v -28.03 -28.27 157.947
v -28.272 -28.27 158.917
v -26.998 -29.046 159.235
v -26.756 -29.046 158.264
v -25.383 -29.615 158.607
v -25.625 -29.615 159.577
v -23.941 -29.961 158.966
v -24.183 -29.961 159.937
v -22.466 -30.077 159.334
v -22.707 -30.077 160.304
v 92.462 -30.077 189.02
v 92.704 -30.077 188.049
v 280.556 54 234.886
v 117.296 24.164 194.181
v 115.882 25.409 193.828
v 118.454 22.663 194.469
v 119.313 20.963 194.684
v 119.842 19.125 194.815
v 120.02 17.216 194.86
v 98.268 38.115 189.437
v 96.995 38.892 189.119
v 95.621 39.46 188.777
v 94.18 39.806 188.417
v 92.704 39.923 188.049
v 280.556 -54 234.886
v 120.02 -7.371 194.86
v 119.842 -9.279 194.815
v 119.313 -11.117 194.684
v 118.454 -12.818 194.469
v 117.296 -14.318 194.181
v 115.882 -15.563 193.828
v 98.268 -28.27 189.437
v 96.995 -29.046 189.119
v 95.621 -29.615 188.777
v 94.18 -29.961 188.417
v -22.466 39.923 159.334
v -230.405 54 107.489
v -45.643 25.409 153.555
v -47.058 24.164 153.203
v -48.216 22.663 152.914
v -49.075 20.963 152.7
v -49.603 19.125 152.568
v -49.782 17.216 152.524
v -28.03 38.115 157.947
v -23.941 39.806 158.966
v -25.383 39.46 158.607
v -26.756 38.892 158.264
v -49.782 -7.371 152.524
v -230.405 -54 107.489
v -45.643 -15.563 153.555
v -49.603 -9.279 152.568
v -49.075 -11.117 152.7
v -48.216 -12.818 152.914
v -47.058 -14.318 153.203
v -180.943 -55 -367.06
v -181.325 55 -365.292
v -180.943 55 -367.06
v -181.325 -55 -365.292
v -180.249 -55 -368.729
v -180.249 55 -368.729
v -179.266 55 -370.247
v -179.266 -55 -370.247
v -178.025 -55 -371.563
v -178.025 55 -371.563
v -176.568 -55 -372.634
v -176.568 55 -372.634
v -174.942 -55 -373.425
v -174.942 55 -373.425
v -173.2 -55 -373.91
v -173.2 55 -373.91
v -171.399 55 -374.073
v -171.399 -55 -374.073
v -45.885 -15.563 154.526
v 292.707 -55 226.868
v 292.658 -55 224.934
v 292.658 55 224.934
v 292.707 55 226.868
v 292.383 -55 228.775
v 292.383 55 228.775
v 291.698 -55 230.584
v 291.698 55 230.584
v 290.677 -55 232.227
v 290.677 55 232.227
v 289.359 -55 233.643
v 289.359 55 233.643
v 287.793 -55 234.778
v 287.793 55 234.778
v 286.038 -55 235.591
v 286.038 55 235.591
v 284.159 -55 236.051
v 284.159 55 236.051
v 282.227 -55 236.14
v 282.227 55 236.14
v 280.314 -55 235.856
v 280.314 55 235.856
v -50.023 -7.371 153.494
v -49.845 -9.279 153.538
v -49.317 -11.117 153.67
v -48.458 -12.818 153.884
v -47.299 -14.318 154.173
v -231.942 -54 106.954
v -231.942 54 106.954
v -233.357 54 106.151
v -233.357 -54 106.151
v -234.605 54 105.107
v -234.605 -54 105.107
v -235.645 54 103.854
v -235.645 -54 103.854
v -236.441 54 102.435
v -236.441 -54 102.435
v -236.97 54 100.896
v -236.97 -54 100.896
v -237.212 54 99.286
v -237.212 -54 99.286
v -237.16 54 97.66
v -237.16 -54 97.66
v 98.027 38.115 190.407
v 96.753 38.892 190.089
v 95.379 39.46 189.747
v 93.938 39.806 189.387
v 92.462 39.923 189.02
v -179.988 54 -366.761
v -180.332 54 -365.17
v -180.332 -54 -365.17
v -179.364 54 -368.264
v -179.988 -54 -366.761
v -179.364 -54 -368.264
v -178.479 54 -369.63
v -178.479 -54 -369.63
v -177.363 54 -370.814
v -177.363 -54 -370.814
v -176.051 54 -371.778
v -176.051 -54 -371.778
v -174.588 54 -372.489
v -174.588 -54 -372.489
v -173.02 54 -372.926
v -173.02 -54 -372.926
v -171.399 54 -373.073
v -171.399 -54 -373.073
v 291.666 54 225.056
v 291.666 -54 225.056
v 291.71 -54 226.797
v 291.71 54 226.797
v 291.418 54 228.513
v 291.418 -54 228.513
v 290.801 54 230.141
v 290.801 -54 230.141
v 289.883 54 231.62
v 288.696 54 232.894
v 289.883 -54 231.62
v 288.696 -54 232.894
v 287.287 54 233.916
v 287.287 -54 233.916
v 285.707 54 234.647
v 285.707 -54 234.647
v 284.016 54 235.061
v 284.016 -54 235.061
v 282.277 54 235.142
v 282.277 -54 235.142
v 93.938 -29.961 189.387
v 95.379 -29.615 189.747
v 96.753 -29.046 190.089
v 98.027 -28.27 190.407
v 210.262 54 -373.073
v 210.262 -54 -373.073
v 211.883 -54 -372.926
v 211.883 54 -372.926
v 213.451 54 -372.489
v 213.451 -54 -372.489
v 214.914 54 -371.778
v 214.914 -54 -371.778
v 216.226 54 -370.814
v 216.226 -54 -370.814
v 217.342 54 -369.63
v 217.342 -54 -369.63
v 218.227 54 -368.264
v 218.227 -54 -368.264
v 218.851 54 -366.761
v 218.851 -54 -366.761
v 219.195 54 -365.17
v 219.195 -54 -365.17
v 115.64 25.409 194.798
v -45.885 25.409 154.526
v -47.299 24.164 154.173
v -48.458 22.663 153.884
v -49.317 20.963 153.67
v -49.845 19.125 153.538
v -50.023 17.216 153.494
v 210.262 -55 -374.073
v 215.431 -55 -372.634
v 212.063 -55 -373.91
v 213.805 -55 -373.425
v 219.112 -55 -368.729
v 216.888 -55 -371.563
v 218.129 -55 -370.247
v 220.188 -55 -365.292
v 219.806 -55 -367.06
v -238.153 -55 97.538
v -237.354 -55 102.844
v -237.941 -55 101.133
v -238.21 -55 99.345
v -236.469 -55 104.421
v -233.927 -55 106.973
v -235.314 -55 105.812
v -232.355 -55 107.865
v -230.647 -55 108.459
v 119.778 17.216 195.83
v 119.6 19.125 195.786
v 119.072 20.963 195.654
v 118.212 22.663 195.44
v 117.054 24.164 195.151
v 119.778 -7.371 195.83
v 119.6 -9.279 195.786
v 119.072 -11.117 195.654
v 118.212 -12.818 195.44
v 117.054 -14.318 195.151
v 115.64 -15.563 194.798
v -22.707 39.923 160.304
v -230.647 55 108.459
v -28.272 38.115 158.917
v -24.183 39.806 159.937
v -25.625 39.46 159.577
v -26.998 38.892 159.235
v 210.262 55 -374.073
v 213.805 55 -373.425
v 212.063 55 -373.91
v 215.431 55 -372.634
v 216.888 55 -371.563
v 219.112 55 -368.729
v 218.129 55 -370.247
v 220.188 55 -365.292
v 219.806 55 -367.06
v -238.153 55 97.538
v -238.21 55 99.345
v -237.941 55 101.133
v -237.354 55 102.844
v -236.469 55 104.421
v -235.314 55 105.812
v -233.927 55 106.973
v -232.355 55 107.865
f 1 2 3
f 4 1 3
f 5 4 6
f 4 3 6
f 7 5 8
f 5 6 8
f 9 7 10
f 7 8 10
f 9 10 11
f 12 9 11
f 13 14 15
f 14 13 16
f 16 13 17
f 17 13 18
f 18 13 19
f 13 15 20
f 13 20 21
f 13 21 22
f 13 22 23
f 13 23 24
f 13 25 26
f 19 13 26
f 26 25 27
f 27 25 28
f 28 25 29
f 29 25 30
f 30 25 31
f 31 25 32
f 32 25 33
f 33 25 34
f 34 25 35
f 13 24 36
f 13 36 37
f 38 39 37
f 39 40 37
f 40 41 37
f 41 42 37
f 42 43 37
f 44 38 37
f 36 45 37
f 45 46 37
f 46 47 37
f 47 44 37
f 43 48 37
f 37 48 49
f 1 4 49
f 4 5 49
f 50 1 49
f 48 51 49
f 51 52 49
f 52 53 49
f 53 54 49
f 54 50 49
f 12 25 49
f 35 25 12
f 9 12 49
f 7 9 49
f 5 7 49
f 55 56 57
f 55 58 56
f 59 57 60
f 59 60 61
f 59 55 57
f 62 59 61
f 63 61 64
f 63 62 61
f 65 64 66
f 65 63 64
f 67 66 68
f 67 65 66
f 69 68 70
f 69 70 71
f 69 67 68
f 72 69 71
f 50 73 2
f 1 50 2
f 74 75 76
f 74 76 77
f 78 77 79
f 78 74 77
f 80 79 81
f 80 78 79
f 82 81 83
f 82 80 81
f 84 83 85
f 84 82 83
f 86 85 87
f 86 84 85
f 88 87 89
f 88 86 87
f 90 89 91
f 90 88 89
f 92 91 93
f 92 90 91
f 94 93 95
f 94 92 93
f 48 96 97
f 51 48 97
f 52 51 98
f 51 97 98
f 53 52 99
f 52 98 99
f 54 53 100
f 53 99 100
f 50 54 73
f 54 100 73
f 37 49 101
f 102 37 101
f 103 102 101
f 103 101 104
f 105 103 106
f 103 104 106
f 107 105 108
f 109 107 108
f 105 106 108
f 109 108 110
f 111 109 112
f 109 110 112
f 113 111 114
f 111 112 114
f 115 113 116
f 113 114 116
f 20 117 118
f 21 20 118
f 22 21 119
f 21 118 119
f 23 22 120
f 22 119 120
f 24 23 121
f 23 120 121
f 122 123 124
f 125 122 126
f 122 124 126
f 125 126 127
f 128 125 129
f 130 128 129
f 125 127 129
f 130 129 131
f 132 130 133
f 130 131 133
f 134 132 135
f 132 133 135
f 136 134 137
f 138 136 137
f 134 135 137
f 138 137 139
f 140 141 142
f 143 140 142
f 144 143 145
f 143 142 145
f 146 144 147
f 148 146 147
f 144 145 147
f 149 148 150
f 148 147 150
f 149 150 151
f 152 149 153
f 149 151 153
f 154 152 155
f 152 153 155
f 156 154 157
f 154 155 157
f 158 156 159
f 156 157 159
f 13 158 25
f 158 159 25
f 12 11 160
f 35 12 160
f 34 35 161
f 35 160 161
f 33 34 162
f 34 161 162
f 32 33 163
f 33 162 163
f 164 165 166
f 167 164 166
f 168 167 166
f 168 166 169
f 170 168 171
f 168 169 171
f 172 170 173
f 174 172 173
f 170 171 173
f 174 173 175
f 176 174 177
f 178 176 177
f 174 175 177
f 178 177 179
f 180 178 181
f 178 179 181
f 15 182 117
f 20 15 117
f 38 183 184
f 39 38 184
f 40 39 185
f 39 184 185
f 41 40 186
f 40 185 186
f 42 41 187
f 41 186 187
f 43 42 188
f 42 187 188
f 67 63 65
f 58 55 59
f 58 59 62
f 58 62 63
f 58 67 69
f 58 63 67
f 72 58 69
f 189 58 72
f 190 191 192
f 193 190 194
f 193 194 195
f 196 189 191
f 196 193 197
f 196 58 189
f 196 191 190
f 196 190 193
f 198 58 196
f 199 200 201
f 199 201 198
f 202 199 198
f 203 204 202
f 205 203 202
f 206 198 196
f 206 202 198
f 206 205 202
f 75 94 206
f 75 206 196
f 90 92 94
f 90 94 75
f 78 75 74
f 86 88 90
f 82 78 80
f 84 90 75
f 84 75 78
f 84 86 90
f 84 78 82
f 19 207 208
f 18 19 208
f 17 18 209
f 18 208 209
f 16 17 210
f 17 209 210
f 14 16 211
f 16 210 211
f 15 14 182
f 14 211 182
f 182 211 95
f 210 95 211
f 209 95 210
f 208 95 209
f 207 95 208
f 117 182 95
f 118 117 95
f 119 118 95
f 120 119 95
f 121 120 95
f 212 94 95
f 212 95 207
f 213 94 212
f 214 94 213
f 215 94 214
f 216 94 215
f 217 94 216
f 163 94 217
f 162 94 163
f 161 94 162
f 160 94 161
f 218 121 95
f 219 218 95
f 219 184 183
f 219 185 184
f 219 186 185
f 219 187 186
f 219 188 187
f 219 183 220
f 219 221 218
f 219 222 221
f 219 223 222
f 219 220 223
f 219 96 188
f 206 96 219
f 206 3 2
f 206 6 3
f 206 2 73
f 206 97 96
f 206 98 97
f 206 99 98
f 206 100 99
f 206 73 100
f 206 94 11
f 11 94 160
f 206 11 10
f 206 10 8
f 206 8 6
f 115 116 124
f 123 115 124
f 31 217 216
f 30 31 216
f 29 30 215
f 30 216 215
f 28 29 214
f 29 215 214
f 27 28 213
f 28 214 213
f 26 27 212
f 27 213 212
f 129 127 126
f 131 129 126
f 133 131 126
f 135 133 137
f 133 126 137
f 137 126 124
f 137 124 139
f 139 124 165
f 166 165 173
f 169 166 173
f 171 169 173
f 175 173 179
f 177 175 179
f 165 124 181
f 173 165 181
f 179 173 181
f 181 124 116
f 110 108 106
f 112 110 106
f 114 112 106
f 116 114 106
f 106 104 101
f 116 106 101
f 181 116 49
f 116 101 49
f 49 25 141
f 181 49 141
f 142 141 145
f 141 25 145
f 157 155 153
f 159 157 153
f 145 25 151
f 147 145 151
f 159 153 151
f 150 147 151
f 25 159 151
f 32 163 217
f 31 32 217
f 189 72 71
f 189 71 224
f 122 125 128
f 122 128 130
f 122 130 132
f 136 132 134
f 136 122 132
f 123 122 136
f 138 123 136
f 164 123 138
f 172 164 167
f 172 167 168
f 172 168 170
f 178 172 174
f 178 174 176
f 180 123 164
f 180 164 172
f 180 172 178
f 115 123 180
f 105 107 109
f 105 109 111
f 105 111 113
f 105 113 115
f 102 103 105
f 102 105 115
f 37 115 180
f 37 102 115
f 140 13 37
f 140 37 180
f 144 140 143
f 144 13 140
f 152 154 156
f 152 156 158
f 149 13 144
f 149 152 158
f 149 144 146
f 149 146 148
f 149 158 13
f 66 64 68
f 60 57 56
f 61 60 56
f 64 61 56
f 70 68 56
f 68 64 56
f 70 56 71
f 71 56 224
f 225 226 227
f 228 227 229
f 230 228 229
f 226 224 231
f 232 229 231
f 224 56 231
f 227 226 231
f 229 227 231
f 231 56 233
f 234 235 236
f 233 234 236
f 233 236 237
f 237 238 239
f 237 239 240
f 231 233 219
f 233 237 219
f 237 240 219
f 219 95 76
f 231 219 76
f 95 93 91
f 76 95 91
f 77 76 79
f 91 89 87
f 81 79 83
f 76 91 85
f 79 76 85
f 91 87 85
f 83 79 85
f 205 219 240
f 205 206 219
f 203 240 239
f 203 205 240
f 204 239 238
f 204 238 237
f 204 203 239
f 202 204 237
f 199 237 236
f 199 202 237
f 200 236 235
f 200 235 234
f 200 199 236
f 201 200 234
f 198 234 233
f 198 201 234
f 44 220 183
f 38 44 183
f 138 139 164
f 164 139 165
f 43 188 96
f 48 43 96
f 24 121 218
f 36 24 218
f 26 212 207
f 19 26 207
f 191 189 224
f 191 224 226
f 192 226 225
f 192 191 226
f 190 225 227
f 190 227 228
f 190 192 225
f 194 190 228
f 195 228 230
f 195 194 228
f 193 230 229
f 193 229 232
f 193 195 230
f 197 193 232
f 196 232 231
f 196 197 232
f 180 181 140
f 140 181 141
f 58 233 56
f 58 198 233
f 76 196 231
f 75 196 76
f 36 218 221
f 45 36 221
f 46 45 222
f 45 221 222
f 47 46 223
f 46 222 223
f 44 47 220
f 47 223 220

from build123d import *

# Parameters (mm, degrees)
F1_DEPTH = 55
F2_T     = -1
F4_DEPTH = 1


with BuildPart() as f1:
    # F0 (on Front) → F1 (new body, symmetric)
    with BuildSketch(Plane.XZ):
        with BuildLine():
            ThreePointArc((-181.3245903513, -365.2919652377), (-178.0253293171, -371.5628290115), (-171.3991288349, -374.0732718036))
            Line((-171.3991288349, -374.0732718036), (210.2621403614, -374.0732718036))
            ThreePointArc((210.2621403614, -374.0732718036), (216.8883408435, -371.5628290115), (220.1876018778, -365.2919652377))
            Line((220.1876018778, -365.2919652377), (292.6582958135, 224.9344720505))
            ThreePointArc((292.6582958135, 224.9344720505), (289.3590347792, 233.6427226924), (280.3136153411, 235.8561227473))
            Line((280.3136153411, 235.8561227473), (-230.6466922573, 108.4594097216))
            ThreePointArc((-230.6466922573, 108.4594097216), (-236.4687351875, 104.4205148281), (-238.1529348177, 97.5377590248))
            Line((-238.1529348177, 97.5377590248), (-181.3245903513, -365.2919652377))
        make_face()
    extrude(amount=F1_DEPTH, both=True)

    # F2 (hollow: no face is removed)
    offset(amount=F2_T, mode=Mode.SUBTRACT)

    # F3 (on face) → F4 (cut, through all)
    with BuildSketch(Plane(origin=(-38.9581795543, 0, 156.2527237618), x_dir=(0.9702957263, 0, 0.2419218956), z_dir=(-0.2419218956, 0, 0.9702957263))):
        with BuildLine():
            ThreePointArc((-7.1386698707, 25.4085332208), (-10.2738331899, 21.8343178236), (-11.404046427, 17.2162140156))
            Line((-11.404046427, 17.2162140156), (-11.404046427, -7.3706747529))
            ThreePointArc((-11.404046427, -7.3706747529), (-10.2738331899, -11.988778561), (-7.1386698707, -15.5629939581))
            Line((-7.1386698707, -15.5629939581), (11.0135524375, -28.2695495739))
            ThreePointArc((11.0135524375, -28.2695495739), (13.7417820324, -29.6146092552), (16.7481758812, -30.0772303687))
            Line((16.7481758812, -30.0772303687), (135.4437312648, -30.0772303687))
            ThreePointArc((135.4437312648, -30.0772303687), (138.4501251136, -29.6146092552), (141.1783547084, -28.2695495739))
            Line((141.1783547084, -28.2695495739), (159.3305770166, -15.5629939581))
            ThreePointArc((159.3305770166, -15.5629939581), (162.4657403358, -11.988778561), (163.595953573, -7.3706747529))
            Line((163.595953573, -7.3706747529), (163.595953573, 17.2162140156))
            ThreePointArc((163.595953573, 17.2162140156), (162.4657403358, 21.8343178236), (159.3305770166, 25.4085332208))
            Line((159.3305770166, 25.4085332208), (141.1783547084, 38.1150888365))
            ThreePointArc((141.1783547084, 38.1150888365), (138.4501251136, 39.4601485179), (135.4437312648, 39.9227696313))
            Line((135.4437312648, 39.9227696313), (16.7481758812, 39.9227696313))
            ThreePointArc((16.7481758812, 39.9227696313), (13.7417820324, 39.4601485179), (11.0135524375, 38.1150888365))
            Line((11.0135524375, 38.1150888365), (-7.1386698707, 25.4085332208))
        make_face()
    extrude(amount=-F4_DEPTH, mode=Mode.SUBTRACT)


solid = f1.part
